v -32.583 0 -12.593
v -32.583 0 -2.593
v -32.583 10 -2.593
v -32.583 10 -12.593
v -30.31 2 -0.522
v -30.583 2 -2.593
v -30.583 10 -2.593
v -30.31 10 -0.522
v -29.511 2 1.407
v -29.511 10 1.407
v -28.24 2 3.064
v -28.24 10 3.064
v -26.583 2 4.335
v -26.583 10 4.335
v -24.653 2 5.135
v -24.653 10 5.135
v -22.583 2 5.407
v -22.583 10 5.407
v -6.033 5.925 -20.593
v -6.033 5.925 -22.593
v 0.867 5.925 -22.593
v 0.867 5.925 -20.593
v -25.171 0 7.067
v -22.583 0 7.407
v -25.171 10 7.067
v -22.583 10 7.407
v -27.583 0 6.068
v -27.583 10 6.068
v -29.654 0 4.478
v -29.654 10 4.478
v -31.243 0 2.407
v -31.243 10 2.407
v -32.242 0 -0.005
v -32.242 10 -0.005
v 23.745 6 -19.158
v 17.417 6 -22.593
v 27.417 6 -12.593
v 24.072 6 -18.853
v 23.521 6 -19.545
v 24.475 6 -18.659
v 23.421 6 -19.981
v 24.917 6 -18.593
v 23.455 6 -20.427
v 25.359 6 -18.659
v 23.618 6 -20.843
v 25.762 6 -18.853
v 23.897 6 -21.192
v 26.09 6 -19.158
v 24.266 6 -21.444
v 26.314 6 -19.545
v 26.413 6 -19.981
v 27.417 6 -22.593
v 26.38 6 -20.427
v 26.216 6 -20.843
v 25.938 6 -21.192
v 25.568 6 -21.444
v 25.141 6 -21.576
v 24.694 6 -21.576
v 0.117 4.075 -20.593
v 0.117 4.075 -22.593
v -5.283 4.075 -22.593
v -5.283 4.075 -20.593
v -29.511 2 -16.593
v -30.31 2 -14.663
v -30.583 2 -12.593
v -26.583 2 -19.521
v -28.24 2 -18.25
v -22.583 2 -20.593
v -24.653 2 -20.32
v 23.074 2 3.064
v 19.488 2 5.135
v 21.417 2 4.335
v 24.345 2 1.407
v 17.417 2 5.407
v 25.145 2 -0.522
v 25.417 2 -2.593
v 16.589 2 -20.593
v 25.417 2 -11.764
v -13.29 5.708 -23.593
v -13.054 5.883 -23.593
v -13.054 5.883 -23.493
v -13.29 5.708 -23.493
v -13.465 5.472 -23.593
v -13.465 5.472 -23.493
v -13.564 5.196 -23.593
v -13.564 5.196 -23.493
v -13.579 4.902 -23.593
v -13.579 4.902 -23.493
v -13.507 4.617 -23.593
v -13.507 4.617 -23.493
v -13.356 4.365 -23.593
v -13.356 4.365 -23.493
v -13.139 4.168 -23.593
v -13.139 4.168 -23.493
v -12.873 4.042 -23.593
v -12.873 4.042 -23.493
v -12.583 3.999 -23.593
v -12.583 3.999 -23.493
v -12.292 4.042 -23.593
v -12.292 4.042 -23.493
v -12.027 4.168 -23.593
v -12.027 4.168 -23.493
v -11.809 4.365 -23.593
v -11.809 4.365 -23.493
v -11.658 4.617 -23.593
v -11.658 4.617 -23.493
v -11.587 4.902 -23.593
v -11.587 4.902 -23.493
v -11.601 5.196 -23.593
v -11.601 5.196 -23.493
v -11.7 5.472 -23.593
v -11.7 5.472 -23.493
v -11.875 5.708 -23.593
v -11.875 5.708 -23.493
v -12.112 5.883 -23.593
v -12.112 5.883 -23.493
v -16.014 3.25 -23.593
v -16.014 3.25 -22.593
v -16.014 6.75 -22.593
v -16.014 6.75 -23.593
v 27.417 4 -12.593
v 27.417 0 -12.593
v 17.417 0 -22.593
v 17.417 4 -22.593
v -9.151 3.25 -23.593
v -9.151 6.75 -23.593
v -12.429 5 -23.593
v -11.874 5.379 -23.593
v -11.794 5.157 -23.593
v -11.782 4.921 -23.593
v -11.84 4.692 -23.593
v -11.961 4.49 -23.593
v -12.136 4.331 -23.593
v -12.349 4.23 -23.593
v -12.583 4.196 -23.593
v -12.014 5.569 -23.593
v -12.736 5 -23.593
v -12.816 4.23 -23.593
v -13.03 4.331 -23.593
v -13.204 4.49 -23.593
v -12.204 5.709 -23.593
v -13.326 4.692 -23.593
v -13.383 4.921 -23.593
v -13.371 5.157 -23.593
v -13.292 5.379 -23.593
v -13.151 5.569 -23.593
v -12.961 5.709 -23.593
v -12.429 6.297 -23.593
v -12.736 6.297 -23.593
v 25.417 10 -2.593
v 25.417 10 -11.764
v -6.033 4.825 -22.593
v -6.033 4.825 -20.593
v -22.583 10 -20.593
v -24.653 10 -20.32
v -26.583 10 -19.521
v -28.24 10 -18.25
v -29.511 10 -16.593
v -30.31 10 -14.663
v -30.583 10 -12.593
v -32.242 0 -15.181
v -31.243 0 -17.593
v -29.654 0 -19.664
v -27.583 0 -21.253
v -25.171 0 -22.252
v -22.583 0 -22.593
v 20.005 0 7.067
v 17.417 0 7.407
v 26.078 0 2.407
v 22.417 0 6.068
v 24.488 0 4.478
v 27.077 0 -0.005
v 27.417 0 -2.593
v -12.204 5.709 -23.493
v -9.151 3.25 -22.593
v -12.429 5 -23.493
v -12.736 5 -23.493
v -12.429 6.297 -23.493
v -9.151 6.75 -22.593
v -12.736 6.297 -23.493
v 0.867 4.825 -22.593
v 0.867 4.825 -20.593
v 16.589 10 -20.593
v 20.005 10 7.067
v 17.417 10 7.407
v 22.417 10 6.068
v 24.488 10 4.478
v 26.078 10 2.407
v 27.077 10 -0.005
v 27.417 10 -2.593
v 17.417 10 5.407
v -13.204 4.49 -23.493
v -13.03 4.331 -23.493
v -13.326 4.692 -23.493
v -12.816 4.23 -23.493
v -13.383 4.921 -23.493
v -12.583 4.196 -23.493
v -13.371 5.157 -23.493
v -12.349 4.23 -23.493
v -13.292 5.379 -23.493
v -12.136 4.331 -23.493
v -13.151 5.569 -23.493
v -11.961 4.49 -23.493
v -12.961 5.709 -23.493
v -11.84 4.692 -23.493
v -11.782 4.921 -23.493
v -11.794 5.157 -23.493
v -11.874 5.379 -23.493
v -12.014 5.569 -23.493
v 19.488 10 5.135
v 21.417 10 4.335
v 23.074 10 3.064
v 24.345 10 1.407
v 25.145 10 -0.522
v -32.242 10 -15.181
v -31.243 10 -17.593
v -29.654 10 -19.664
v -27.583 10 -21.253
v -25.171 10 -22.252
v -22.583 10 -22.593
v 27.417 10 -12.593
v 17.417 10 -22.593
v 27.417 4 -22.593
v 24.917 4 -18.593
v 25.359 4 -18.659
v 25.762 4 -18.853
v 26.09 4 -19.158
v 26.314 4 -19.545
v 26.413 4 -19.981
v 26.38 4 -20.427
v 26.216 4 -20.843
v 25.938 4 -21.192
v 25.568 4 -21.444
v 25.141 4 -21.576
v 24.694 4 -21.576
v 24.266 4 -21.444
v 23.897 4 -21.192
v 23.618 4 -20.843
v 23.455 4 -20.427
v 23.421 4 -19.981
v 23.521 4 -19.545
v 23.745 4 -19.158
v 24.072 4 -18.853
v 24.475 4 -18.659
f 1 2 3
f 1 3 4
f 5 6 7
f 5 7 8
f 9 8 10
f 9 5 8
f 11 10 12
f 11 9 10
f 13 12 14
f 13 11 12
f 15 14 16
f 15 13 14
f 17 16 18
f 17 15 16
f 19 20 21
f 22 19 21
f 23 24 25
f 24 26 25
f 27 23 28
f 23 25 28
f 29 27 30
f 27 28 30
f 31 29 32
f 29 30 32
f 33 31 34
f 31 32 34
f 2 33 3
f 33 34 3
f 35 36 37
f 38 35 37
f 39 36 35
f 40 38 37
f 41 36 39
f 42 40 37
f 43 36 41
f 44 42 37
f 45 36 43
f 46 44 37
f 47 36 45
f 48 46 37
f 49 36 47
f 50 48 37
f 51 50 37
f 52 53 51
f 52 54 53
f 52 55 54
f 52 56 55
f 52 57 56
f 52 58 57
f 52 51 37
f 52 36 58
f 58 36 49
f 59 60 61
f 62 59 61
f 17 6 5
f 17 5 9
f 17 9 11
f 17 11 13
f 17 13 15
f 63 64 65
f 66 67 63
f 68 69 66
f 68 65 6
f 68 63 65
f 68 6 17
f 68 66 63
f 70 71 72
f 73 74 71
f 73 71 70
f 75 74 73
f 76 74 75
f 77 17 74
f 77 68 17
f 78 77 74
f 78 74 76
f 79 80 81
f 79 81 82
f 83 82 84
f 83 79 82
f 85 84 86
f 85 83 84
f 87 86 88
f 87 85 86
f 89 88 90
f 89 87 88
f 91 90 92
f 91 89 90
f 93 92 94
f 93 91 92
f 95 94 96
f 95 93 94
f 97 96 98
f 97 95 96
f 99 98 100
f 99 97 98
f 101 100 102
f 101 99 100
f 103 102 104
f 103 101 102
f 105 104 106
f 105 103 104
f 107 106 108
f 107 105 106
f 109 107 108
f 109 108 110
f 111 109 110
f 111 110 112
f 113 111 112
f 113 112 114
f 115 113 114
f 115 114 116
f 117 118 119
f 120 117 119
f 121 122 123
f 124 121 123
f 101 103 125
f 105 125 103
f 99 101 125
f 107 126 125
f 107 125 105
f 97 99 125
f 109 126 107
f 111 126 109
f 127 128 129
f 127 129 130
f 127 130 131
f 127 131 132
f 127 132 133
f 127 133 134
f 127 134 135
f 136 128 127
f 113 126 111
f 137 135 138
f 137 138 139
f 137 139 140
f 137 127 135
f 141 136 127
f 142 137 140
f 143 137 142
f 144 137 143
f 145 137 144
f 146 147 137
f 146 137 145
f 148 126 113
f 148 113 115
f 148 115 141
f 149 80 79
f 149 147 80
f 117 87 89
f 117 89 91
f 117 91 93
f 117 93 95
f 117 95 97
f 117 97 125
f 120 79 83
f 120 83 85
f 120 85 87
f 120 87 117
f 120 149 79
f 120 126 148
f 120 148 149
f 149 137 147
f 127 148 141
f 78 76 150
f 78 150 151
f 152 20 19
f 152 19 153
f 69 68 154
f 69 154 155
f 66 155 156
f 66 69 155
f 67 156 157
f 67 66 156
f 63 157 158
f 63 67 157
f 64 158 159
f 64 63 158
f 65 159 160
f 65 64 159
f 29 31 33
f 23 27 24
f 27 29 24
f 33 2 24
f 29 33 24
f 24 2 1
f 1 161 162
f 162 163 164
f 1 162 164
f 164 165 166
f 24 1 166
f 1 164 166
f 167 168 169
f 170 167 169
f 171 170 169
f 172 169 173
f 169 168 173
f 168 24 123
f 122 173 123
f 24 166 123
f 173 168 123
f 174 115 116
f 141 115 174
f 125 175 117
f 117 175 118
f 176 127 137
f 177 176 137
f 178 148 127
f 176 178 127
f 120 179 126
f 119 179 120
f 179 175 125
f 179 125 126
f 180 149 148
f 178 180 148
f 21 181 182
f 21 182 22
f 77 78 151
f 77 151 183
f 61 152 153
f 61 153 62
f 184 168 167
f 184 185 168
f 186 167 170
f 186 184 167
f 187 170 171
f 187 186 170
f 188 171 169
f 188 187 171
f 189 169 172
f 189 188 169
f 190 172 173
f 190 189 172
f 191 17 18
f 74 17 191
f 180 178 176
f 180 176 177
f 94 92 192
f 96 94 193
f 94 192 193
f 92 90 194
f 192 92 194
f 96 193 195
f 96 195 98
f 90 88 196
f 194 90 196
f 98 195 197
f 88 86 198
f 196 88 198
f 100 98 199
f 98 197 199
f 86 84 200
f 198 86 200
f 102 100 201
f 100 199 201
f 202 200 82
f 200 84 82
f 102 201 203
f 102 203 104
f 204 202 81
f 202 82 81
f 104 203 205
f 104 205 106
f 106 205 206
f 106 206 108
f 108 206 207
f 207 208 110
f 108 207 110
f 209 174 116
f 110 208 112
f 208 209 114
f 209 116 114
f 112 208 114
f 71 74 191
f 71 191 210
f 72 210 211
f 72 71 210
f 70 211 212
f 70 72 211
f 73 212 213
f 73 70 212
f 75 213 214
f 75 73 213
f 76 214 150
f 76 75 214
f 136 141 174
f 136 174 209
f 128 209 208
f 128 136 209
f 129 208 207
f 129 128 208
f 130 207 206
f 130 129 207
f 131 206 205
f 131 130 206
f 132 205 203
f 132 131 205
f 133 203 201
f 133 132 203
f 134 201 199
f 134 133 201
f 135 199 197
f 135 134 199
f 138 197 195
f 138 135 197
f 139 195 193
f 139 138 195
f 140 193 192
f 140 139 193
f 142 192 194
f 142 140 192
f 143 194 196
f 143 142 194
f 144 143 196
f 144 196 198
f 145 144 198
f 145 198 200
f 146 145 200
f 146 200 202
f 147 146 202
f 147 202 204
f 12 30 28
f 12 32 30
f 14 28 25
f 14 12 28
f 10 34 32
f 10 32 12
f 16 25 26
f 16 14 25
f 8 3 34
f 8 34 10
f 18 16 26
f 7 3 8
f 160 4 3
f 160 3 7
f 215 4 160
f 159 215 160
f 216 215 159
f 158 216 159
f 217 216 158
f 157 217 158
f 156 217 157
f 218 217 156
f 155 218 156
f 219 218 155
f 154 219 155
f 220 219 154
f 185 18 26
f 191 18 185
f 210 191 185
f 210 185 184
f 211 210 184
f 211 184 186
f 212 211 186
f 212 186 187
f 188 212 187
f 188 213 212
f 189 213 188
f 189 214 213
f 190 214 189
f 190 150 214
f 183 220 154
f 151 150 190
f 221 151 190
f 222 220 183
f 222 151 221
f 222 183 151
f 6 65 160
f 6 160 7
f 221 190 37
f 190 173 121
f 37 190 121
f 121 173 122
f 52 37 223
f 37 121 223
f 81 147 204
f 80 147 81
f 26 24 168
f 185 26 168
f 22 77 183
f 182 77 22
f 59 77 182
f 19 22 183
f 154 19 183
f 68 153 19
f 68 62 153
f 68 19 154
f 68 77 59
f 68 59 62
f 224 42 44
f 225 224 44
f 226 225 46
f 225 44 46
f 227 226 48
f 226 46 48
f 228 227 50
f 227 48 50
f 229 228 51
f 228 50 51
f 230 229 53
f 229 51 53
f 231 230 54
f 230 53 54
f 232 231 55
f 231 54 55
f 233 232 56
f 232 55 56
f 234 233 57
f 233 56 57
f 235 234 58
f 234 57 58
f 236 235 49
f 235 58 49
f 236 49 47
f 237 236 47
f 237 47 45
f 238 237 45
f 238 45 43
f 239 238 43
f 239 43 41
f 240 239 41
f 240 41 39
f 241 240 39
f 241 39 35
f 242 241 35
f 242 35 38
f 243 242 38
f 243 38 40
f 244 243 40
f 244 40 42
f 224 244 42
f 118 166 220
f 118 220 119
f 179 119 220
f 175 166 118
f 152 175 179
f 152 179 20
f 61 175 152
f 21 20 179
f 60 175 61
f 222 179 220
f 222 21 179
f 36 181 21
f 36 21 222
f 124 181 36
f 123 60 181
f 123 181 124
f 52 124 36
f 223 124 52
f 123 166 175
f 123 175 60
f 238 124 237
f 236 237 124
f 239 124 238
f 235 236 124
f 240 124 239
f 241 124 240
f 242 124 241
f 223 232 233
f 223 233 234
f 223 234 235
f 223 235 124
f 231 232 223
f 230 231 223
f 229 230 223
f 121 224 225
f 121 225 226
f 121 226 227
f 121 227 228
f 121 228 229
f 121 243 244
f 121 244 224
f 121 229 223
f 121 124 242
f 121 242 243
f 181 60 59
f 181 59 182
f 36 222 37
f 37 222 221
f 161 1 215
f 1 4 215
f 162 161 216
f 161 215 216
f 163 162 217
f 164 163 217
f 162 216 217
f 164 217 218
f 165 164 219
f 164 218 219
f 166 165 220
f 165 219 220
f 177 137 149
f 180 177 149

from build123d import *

# Parameters (mm, degrees)
SKETCH1_W           = 60
SKETCH1_H           = 30
BOSS_EXTRUDE1_DEPTH = 10
FILLET1_R           = 10
FILLET3_R           = 10
FILLET4_R           = 10
CUT_EXTRUDE1_DEPTH  = 4
CUT_EXTRUDE2_DEPTH  = 4
SKETCH8_R           = 1.5
CUT_EXTRUDE3_DEPTH  = 4
SHELL5_START        = 2
SHELL5_DEPTH        = 8
CUT_EXTRUDE4_DEPTH  = 2
SKETCH11_W          = 6.86286456
SKETCH11_H          = 3.5
BOSS_EXTRUDE2_DEPTH = 1
CUT_EXTRUDE5_DEPTH  = 0.1


# Read off the part's stored shape, not the designer's step: Shell5
with BuildPart() as part:
    # Sketch1 → Boss-Extrude1 (new body)
    with BuildSketch(Plane(origin=(0, 0, 0), x_dir=(1, 0, 0), z_dir=(0, 1, 0))):
        with Locations((-2.582747066, 7.592753862)):
            Rectangle(SKETCH1_W, SKETCH1_H)
    extrude(amount=BOSS_EXTRUDE1_DEPTH)

    # Fillet1
    fillet1_edges = [part.edges().sort_by_distance(p)[0] for p in [
        (27.417252934, 5, 7.407246138),
    ]]
    fillet(fillet1_edges, radius=FILLET1_R)

    # Fillet3
    fillet3_edges = [part.edges().sort_by_distance(p)[0] for p in [
        (-32.582747066, 5, 7.407246138),
    ]]
    fillet(fillet3_edges, radius=FILLET3_R)

    # Fillet4
    fillet4_edges = [part.edges().sort_by_distance(p)[0] for p in [
        (-32.582747066, 5, -22.592753862),
    ]]
    fillet(fillet4_edges, radius=FILLET4_R)

    # Sketch6 → Cut-Extrude1 (cut)
    with BuildSketch(Plane(origin=(0, 10, 0), x_dir=(1, 0, 0), z_dir=(0, 1, 0))):
        Polygon((17.417252934, 22.592753862), (27.417252934, 12.592753862), (27.417252934, 22.592753862), align=None)
    extrude(amount=-CUT_EXTRUDE1_DEPTH, mode=Mode.SUBTRACT)

    # Sketch7 → Cut-Extrude2 (cut)
    with BuildSketch(Plane.XZ):
        Polygon((27.417252934, -22.592753862), (27.417252934, -12.592753862), (17.417252934, -22.592753862), align=None)
    extrude(amount=-CUT_EXTRUDE2_DEPTH, mode=Mode.SUBTRACT)

    # Sketch8 → Cut-Extrude3 (cut)
    with BuildSketch(Plane(origin=(0, 6, 0), x_dir=(1, 0, 0), z_dir=(0, 1, 0))):
        with Locations(Location((24.917252934, 20.092753862, 0), (0, 0, 270))):
            Circle(SKETCH8_R)
    extrude(amount=-CUT_EXTRUDE3_DEPTH, mode=Mode.SUBTRACT)

    # Shell5 outline → Shell5 (cut)
    with BuildSketch(Plane(origin=(0, 0, 0), x_dir=(1, 0, 0), z_dir=(0, 1, 0)).offset(SHELL5_START)):
        with BuildLine():
            Line((25.417252934, 2.592753862), (25.417252934, 11.764326737))
            Line((25.417252934, 11.764326737), (16.588825809, 20.592753862))
            Line((16.588825809, 20.592753862), (-22.582747066, 20.592753862))
            ThreePointArc((-22.582747066, 20.592753862), (-28.239601315, 18.249608111), (-30.582747066, 12.592753862))
            Line((-30.582747066, 12.592753862), (-30.582747066, 2.592753862))
            ThreePointArc((-30.582747066, 2.592753862), (-28.239601315, -3.064100388), (-22.582747066, -5.407246138))
            Line((-22.582747066, -5.407246138), (17.417252934, -5.407246138))
            ThreePointArc((17.417252934, -5.407246138), (23.074107184, -3.064100387), (25.417252934, 2.592753862))
        make_face()
    extrude(amount=SHELL5_DEPTH, mode=Mode.SUBTRACT)

    # Sketch10 → Cut-Extrude4 (cut)
    with BuildSketch(Plane(origin=(0, 0, -22.592753862), x_dir=(-1, 0, 0), z_dir=(0, 0, -1))):
        Polygon((2.582747066, 5.925), (6.032747066, 5.925), (6.032747066, 4.825), (5.282747066, 4.075), (2.582747066, 4.075), (-0.117252934, 4.075), (-0.867252934, 4.825), (-0.867252934, 5.925), align=None)
    extrude(amount=-CUT_EXTRUDE4_DEPTH, mode=Mode.SUBTRACT)

    # Sketch11 → Boss-Extrude2 (add)
    with BuildSketch(Plane(origin=(0, 0, -22.592753862), x_dir=(-1, 0, 0), z_dir=(0, 0, -1))):
        with Locations((12.582747066, 5)):
            Rectangle(SKETCH11_W, SKETCH11_H)
    extrude(amount=BOSS_EXTRUDE2_DEPTH)

    # Sketch12 → Cut-Extrude5 (cut)
    with BuildSketch(Plane(origin=(0, 0, -23.592753862), x_dir=(-1, 0, 0), z_dir=(0, 0, -1))):
        Polygon((12.582747066, 5), (12.735825542, 5), (12.735825542, 6.297110067), (12.428698836, 6.297110067), (12.428698836, 5), align=None)
        with BuildLine():
            Line((12.111519237, 5.882859707), (12.204075045, 5.709453579))
            ThreePointArc((12.204075045, 5.709453579), (12.582747066, 4.195812907), (12.961419087, 5.709453579))
            Line((12.961419087, 5.709453579), (13.053974895, 5.882859707))
            ThreePointArc((13.053974895, 5.882859707), (12.582747066, 3.999251816), (12.111519237, 5.882859707))
        make_face()
    extrude(amount=-CUT_EXTRUDE5_DEPTH, mode=Mode.SUBTRACT)


solid = part.part
